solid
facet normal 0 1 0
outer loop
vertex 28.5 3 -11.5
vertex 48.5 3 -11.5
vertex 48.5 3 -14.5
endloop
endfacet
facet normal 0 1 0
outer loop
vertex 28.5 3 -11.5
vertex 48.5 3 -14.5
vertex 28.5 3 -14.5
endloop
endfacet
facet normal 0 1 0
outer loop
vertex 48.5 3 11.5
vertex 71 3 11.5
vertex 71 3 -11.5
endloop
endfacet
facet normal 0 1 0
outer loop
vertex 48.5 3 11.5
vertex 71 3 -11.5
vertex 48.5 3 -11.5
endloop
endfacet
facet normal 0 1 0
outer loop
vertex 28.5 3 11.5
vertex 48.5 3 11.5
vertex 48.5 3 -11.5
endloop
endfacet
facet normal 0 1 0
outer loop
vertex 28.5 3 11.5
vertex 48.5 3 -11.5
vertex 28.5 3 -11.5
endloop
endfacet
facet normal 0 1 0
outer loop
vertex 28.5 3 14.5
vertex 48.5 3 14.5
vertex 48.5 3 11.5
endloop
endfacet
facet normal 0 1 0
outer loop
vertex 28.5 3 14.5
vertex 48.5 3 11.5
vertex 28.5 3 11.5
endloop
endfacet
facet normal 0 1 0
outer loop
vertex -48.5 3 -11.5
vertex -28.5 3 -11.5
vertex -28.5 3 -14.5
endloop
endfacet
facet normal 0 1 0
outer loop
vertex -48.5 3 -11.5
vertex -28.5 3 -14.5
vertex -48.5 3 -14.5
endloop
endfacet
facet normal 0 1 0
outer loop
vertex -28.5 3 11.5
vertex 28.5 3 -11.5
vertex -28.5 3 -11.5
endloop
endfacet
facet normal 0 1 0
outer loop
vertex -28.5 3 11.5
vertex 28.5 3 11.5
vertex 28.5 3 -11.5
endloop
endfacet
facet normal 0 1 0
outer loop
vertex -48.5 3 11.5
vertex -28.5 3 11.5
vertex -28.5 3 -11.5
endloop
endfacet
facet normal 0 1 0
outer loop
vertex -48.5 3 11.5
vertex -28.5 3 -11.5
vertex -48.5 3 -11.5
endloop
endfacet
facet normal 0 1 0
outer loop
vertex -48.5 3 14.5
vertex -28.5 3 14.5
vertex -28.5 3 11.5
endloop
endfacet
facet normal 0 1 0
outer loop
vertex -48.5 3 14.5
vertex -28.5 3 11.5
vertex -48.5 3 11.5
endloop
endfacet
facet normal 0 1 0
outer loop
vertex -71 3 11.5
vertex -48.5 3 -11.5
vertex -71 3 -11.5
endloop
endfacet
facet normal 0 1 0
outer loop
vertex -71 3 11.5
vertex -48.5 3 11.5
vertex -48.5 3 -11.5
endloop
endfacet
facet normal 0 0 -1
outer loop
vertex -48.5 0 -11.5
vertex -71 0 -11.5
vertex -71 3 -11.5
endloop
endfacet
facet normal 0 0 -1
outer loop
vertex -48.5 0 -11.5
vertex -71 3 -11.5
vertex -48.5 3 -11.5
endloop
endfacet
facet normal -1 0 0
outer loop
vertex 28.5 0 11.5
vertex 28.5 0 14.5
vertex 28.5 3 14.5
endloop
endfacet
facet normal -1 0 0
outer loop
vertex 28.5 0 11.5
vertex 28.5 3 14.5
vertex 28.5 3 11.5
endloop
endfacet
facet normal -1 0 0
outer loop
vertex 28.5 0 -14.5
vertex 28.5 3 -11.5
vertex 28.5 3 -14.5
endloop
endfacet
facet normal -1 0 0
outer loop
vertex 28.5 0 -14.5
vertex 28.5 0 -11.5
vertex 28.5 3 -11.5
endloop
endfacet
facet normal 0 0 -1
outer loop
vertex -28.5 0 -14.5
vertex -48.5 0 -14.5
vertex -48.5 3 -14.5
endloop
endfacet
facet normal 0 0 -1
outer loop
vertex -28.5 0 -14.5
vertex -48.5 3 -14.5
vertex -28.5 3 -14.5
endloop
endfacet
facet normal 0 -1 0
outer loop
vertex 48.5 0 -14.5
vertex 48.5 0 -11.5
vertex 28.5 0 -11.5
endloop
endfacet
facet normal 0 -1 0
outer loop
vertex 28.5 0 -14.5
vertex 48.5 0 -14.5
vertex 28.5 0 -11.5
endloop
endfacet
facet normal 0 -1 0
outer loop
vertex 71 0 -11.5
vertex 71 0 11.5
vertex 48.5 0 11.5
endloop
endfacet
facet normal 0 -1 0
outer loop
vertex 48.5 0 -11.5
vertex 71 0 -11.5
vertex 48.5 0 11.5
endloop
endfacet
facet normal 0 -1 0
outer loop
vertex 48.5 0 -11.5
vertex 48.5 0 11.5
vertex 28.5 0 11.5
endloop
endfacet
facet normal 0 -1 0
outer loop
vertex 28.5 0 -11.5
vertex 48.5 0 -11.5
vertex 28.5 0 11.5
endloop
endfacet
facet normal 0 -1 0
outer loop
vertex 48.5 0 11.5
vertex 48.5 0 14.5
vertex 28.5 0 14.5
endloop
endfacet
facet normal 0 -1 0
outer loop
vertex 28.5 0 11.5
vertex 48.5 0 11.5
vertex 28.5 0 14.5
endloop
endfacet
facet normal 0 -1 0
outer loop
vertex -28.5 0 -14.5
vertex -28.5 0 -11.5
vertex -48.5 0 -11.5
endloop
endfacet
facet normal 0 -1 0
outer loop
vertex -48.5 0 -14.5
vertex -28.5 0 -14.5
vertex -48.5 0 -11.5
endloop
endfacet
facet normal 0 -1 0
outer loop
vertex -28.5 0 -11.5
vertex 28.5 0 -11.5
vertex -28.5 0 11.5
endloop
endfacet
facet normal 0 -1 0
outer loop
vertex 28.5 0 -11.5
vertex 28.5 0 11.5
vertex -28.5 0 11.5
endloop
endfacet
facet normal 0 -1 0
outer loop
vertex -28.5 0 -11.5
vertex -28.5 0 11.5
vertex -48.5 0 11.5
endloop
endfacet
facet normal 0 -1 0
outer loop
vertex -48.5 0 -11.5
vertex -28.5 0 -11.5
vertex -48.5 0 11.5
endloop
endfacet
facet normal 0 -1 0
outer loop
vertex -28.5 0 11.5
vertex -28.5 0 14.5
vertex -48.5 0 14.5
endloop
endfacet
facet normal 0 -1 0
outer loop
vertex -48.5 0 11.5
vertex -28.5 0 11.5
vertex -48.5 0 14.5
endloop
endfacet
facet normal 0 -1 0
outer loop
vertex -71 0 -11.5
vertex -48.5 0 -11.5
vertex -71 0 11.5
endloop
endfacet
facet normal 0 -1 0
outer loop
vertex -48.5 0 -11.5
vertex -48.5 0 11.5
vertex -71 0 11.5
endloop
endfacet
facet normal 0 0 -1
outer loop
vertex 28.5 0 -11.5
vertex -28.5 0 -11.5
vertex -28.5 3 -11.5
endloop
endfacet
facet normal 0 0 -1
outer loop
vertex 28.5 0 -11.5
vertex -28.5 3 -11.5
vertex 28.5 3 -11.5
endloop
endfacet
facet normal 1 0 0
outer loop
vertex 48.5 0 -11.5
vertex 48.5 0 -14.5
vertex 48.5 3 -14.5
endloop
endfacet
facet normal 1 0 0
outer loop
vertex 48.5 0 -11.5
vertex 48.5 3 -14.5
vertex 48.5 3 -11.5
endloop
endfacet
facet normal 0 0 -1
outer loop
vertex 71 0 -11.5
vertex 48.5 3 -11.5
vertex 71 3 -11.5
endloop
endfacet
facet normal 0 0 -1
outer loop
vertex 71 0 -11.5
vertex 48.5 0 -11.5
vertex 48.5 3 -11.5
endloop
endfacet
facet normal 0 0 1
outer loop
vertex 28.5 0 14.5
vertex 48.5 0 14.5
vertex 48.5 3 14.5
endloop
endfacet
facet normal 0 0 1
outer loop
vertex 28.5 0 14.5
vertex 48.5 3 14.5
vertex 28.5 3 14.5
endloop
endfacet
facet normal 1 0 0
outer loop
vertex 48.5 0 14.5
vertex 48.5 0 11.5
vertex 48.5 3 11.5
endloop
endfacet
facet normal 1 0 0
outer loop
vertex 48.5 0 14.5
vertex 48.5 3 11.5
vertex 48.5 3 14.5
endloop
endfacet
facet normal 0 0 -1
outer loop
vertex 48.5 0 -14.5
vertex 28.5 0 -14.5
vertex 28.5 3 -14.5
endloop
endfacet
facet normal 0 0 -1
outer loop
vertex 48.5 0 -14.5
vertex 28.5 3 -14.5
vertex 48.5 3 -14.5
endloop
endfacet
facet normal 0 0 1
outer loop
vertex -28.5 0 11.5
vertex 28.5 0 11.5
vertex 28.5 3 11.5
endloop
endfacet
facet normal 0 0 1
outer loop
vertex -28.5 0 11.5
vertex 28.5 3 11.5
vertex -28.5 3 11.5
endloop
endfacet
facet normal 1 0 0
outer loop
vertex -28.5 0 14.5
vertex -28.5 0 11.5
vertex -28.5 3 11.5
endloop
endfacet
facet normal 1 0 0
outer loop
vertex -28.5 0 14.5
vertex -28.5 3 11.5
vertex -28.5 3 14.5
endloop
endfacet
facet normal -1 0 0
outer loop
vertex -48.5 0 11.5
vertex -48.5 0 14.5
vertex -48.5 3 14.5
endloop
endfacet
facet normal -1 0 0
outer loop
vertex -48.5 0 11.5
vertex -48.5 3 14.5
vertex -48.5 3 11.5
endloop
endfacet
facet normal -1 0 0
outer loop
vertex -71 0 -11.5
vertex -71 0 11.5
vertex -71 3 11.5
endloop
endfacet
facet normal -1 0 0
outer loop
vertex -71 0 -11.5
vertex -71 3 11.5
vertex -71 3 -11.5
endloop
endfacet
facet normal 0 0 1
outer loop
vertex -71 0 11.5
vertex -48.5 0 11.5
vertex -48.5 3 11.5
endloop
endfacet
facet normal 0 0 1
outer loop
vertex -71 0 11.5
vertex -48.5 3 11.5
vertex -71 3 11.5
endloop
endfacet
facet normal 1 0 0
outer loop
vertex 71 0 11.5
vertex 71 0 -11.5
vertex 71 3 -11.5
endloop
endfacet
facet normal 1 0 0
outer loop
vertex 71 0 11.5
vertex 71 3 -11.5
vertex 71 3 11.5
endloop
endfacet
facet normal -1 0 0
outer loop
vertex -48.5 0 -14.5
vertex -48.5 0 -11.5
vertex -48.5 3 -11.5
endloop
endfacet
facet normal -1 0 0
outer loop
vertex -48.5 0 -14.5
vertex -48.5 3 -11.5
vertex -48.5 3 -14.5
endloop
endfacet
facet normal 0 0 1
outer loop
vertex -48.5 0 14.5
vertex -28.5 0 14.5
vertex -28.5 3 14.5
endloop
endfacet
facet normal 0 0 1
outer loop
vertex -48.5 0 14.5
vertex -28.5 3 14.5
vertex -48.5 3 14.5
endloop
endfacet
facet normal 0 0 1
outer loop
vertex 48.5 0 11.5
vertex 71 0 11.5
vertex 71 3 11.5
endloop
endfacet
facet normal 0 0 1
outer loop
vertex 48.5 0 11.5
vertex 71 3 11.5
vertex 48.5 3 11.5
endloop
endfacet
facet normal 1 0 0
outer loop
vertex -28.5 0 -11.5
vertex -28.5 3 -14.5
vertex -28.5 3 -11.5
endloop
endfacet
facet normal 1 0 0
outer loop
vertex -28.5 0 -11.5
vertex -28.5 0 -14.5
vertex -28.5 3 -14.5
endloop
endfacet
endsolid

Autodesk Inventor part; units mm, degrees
ref_plane "YZ Plane" through (0, 0, 0) normal (1, 0, 0) x (0, 1, 0)
ref_plane "XZ Plane" through (0, 0, 0) normal (0, 1, 0) x (-1, 0, 0)
ref_plane "XY Plane" through (0, 0, 0) normal (0, 0, 1) x (1, 0, 0)
sketch "Sketch1" plane through (0, 0, 0) normal (0, 1, 0) x (-1, 0, 0)
  line L0 (71, -11.5) -> (-71, -11.5)
  line L1 (-71, -11.5) -> (-71, 11.5)
  line L2 (-71, 11.5) -> (71, 11.5)
  line L3 (71, 11.5) -> (71, -11.5)
  line L4 (68, -11.5) -> (68, 11.5)
  line L5 (48.5, -14.5) -> (28.5, -14.5)
  line L6 (28.5, -14.5) -> (28.5, -11.5)
  line L7 (28.5, -11.5) -> (48.5, -11.5)
  line L8 (48.5, -11.5) -> (48.5, -14.5)
  line L9 (48.5, 11.5) -> (28.5, 11.5)
  line L10 (28.5, 11.5) -> (28.5, 14.5)
  line L11 (28.5, 14.5) -> (48.5, 14.5)
  line L12 (48.5, 14.5) -> (48.5, 11.5)
  line L13 (38.5, -14.5) -> (38.5, -11.5) construction
  line L14 (-48.5, -14.5) -> (-48.5, -11.5)
  line L15 (-38.5, -14.5) -> (-38.5, -11.5) construction
  line L16 (-48.5, -11.5) -> (-28.5, -11.5)
  line L17 (-28.5, 11.5) -> (-48.5, 11.5)
  line L18 (-28.5, -14.5) -> (-48.5, -14.5)
  line L19 (-48.5, 14.5) -> (-28.5, 14.5)
  line L20 (-28.5, 14.5) -> (-28.5, 11.5)
  line L21 (-28.5, -11.5) -> (-28.5, -14.5)
  line L22 (-48.5, 11.5) -> (-48.5, 14.5)
  point P0 (0, 0)
  point P1 (-71, 0)
  point P2 (0, -11.5)
  point P3 (48.5, -11.5)
  point P4 (28.5, -11.5)
  point P5 (-28.5, -11.5)
  point P6 (-48.5, -11.5)
  point P7 (-48.5, 11.5)
  point P8 (-28.5, 11.5)
  point P9 (28.5, 11.5)
  point P10 (48.5, 11.5)
  dimension "d0" = 23
  dimension "d1" = 142
  dimension "d2" = 3
  dimension "d3" = 20
  dimension "d4" = 3
  dimension "d5" = 20
  dimension "d6" = 3
  dimension "d7" = 38.5
  dimension "d10" = 77
extrude "Extrusion1" add sketch "Sketch1" along normal blind 3
equation "\"d0\" = stack"
equation "\"d3\" = finger"
equation "\"d4\" = thickness"
equation "\"d5\" = finger"
equation "\"d15\" = thickness"
equation "\"stack\" = 23"
equation "\"finger\" = 20"
equation "\"thickness\" = 3"
properties part number "BungaSign-Bigger-Sides-Right"
